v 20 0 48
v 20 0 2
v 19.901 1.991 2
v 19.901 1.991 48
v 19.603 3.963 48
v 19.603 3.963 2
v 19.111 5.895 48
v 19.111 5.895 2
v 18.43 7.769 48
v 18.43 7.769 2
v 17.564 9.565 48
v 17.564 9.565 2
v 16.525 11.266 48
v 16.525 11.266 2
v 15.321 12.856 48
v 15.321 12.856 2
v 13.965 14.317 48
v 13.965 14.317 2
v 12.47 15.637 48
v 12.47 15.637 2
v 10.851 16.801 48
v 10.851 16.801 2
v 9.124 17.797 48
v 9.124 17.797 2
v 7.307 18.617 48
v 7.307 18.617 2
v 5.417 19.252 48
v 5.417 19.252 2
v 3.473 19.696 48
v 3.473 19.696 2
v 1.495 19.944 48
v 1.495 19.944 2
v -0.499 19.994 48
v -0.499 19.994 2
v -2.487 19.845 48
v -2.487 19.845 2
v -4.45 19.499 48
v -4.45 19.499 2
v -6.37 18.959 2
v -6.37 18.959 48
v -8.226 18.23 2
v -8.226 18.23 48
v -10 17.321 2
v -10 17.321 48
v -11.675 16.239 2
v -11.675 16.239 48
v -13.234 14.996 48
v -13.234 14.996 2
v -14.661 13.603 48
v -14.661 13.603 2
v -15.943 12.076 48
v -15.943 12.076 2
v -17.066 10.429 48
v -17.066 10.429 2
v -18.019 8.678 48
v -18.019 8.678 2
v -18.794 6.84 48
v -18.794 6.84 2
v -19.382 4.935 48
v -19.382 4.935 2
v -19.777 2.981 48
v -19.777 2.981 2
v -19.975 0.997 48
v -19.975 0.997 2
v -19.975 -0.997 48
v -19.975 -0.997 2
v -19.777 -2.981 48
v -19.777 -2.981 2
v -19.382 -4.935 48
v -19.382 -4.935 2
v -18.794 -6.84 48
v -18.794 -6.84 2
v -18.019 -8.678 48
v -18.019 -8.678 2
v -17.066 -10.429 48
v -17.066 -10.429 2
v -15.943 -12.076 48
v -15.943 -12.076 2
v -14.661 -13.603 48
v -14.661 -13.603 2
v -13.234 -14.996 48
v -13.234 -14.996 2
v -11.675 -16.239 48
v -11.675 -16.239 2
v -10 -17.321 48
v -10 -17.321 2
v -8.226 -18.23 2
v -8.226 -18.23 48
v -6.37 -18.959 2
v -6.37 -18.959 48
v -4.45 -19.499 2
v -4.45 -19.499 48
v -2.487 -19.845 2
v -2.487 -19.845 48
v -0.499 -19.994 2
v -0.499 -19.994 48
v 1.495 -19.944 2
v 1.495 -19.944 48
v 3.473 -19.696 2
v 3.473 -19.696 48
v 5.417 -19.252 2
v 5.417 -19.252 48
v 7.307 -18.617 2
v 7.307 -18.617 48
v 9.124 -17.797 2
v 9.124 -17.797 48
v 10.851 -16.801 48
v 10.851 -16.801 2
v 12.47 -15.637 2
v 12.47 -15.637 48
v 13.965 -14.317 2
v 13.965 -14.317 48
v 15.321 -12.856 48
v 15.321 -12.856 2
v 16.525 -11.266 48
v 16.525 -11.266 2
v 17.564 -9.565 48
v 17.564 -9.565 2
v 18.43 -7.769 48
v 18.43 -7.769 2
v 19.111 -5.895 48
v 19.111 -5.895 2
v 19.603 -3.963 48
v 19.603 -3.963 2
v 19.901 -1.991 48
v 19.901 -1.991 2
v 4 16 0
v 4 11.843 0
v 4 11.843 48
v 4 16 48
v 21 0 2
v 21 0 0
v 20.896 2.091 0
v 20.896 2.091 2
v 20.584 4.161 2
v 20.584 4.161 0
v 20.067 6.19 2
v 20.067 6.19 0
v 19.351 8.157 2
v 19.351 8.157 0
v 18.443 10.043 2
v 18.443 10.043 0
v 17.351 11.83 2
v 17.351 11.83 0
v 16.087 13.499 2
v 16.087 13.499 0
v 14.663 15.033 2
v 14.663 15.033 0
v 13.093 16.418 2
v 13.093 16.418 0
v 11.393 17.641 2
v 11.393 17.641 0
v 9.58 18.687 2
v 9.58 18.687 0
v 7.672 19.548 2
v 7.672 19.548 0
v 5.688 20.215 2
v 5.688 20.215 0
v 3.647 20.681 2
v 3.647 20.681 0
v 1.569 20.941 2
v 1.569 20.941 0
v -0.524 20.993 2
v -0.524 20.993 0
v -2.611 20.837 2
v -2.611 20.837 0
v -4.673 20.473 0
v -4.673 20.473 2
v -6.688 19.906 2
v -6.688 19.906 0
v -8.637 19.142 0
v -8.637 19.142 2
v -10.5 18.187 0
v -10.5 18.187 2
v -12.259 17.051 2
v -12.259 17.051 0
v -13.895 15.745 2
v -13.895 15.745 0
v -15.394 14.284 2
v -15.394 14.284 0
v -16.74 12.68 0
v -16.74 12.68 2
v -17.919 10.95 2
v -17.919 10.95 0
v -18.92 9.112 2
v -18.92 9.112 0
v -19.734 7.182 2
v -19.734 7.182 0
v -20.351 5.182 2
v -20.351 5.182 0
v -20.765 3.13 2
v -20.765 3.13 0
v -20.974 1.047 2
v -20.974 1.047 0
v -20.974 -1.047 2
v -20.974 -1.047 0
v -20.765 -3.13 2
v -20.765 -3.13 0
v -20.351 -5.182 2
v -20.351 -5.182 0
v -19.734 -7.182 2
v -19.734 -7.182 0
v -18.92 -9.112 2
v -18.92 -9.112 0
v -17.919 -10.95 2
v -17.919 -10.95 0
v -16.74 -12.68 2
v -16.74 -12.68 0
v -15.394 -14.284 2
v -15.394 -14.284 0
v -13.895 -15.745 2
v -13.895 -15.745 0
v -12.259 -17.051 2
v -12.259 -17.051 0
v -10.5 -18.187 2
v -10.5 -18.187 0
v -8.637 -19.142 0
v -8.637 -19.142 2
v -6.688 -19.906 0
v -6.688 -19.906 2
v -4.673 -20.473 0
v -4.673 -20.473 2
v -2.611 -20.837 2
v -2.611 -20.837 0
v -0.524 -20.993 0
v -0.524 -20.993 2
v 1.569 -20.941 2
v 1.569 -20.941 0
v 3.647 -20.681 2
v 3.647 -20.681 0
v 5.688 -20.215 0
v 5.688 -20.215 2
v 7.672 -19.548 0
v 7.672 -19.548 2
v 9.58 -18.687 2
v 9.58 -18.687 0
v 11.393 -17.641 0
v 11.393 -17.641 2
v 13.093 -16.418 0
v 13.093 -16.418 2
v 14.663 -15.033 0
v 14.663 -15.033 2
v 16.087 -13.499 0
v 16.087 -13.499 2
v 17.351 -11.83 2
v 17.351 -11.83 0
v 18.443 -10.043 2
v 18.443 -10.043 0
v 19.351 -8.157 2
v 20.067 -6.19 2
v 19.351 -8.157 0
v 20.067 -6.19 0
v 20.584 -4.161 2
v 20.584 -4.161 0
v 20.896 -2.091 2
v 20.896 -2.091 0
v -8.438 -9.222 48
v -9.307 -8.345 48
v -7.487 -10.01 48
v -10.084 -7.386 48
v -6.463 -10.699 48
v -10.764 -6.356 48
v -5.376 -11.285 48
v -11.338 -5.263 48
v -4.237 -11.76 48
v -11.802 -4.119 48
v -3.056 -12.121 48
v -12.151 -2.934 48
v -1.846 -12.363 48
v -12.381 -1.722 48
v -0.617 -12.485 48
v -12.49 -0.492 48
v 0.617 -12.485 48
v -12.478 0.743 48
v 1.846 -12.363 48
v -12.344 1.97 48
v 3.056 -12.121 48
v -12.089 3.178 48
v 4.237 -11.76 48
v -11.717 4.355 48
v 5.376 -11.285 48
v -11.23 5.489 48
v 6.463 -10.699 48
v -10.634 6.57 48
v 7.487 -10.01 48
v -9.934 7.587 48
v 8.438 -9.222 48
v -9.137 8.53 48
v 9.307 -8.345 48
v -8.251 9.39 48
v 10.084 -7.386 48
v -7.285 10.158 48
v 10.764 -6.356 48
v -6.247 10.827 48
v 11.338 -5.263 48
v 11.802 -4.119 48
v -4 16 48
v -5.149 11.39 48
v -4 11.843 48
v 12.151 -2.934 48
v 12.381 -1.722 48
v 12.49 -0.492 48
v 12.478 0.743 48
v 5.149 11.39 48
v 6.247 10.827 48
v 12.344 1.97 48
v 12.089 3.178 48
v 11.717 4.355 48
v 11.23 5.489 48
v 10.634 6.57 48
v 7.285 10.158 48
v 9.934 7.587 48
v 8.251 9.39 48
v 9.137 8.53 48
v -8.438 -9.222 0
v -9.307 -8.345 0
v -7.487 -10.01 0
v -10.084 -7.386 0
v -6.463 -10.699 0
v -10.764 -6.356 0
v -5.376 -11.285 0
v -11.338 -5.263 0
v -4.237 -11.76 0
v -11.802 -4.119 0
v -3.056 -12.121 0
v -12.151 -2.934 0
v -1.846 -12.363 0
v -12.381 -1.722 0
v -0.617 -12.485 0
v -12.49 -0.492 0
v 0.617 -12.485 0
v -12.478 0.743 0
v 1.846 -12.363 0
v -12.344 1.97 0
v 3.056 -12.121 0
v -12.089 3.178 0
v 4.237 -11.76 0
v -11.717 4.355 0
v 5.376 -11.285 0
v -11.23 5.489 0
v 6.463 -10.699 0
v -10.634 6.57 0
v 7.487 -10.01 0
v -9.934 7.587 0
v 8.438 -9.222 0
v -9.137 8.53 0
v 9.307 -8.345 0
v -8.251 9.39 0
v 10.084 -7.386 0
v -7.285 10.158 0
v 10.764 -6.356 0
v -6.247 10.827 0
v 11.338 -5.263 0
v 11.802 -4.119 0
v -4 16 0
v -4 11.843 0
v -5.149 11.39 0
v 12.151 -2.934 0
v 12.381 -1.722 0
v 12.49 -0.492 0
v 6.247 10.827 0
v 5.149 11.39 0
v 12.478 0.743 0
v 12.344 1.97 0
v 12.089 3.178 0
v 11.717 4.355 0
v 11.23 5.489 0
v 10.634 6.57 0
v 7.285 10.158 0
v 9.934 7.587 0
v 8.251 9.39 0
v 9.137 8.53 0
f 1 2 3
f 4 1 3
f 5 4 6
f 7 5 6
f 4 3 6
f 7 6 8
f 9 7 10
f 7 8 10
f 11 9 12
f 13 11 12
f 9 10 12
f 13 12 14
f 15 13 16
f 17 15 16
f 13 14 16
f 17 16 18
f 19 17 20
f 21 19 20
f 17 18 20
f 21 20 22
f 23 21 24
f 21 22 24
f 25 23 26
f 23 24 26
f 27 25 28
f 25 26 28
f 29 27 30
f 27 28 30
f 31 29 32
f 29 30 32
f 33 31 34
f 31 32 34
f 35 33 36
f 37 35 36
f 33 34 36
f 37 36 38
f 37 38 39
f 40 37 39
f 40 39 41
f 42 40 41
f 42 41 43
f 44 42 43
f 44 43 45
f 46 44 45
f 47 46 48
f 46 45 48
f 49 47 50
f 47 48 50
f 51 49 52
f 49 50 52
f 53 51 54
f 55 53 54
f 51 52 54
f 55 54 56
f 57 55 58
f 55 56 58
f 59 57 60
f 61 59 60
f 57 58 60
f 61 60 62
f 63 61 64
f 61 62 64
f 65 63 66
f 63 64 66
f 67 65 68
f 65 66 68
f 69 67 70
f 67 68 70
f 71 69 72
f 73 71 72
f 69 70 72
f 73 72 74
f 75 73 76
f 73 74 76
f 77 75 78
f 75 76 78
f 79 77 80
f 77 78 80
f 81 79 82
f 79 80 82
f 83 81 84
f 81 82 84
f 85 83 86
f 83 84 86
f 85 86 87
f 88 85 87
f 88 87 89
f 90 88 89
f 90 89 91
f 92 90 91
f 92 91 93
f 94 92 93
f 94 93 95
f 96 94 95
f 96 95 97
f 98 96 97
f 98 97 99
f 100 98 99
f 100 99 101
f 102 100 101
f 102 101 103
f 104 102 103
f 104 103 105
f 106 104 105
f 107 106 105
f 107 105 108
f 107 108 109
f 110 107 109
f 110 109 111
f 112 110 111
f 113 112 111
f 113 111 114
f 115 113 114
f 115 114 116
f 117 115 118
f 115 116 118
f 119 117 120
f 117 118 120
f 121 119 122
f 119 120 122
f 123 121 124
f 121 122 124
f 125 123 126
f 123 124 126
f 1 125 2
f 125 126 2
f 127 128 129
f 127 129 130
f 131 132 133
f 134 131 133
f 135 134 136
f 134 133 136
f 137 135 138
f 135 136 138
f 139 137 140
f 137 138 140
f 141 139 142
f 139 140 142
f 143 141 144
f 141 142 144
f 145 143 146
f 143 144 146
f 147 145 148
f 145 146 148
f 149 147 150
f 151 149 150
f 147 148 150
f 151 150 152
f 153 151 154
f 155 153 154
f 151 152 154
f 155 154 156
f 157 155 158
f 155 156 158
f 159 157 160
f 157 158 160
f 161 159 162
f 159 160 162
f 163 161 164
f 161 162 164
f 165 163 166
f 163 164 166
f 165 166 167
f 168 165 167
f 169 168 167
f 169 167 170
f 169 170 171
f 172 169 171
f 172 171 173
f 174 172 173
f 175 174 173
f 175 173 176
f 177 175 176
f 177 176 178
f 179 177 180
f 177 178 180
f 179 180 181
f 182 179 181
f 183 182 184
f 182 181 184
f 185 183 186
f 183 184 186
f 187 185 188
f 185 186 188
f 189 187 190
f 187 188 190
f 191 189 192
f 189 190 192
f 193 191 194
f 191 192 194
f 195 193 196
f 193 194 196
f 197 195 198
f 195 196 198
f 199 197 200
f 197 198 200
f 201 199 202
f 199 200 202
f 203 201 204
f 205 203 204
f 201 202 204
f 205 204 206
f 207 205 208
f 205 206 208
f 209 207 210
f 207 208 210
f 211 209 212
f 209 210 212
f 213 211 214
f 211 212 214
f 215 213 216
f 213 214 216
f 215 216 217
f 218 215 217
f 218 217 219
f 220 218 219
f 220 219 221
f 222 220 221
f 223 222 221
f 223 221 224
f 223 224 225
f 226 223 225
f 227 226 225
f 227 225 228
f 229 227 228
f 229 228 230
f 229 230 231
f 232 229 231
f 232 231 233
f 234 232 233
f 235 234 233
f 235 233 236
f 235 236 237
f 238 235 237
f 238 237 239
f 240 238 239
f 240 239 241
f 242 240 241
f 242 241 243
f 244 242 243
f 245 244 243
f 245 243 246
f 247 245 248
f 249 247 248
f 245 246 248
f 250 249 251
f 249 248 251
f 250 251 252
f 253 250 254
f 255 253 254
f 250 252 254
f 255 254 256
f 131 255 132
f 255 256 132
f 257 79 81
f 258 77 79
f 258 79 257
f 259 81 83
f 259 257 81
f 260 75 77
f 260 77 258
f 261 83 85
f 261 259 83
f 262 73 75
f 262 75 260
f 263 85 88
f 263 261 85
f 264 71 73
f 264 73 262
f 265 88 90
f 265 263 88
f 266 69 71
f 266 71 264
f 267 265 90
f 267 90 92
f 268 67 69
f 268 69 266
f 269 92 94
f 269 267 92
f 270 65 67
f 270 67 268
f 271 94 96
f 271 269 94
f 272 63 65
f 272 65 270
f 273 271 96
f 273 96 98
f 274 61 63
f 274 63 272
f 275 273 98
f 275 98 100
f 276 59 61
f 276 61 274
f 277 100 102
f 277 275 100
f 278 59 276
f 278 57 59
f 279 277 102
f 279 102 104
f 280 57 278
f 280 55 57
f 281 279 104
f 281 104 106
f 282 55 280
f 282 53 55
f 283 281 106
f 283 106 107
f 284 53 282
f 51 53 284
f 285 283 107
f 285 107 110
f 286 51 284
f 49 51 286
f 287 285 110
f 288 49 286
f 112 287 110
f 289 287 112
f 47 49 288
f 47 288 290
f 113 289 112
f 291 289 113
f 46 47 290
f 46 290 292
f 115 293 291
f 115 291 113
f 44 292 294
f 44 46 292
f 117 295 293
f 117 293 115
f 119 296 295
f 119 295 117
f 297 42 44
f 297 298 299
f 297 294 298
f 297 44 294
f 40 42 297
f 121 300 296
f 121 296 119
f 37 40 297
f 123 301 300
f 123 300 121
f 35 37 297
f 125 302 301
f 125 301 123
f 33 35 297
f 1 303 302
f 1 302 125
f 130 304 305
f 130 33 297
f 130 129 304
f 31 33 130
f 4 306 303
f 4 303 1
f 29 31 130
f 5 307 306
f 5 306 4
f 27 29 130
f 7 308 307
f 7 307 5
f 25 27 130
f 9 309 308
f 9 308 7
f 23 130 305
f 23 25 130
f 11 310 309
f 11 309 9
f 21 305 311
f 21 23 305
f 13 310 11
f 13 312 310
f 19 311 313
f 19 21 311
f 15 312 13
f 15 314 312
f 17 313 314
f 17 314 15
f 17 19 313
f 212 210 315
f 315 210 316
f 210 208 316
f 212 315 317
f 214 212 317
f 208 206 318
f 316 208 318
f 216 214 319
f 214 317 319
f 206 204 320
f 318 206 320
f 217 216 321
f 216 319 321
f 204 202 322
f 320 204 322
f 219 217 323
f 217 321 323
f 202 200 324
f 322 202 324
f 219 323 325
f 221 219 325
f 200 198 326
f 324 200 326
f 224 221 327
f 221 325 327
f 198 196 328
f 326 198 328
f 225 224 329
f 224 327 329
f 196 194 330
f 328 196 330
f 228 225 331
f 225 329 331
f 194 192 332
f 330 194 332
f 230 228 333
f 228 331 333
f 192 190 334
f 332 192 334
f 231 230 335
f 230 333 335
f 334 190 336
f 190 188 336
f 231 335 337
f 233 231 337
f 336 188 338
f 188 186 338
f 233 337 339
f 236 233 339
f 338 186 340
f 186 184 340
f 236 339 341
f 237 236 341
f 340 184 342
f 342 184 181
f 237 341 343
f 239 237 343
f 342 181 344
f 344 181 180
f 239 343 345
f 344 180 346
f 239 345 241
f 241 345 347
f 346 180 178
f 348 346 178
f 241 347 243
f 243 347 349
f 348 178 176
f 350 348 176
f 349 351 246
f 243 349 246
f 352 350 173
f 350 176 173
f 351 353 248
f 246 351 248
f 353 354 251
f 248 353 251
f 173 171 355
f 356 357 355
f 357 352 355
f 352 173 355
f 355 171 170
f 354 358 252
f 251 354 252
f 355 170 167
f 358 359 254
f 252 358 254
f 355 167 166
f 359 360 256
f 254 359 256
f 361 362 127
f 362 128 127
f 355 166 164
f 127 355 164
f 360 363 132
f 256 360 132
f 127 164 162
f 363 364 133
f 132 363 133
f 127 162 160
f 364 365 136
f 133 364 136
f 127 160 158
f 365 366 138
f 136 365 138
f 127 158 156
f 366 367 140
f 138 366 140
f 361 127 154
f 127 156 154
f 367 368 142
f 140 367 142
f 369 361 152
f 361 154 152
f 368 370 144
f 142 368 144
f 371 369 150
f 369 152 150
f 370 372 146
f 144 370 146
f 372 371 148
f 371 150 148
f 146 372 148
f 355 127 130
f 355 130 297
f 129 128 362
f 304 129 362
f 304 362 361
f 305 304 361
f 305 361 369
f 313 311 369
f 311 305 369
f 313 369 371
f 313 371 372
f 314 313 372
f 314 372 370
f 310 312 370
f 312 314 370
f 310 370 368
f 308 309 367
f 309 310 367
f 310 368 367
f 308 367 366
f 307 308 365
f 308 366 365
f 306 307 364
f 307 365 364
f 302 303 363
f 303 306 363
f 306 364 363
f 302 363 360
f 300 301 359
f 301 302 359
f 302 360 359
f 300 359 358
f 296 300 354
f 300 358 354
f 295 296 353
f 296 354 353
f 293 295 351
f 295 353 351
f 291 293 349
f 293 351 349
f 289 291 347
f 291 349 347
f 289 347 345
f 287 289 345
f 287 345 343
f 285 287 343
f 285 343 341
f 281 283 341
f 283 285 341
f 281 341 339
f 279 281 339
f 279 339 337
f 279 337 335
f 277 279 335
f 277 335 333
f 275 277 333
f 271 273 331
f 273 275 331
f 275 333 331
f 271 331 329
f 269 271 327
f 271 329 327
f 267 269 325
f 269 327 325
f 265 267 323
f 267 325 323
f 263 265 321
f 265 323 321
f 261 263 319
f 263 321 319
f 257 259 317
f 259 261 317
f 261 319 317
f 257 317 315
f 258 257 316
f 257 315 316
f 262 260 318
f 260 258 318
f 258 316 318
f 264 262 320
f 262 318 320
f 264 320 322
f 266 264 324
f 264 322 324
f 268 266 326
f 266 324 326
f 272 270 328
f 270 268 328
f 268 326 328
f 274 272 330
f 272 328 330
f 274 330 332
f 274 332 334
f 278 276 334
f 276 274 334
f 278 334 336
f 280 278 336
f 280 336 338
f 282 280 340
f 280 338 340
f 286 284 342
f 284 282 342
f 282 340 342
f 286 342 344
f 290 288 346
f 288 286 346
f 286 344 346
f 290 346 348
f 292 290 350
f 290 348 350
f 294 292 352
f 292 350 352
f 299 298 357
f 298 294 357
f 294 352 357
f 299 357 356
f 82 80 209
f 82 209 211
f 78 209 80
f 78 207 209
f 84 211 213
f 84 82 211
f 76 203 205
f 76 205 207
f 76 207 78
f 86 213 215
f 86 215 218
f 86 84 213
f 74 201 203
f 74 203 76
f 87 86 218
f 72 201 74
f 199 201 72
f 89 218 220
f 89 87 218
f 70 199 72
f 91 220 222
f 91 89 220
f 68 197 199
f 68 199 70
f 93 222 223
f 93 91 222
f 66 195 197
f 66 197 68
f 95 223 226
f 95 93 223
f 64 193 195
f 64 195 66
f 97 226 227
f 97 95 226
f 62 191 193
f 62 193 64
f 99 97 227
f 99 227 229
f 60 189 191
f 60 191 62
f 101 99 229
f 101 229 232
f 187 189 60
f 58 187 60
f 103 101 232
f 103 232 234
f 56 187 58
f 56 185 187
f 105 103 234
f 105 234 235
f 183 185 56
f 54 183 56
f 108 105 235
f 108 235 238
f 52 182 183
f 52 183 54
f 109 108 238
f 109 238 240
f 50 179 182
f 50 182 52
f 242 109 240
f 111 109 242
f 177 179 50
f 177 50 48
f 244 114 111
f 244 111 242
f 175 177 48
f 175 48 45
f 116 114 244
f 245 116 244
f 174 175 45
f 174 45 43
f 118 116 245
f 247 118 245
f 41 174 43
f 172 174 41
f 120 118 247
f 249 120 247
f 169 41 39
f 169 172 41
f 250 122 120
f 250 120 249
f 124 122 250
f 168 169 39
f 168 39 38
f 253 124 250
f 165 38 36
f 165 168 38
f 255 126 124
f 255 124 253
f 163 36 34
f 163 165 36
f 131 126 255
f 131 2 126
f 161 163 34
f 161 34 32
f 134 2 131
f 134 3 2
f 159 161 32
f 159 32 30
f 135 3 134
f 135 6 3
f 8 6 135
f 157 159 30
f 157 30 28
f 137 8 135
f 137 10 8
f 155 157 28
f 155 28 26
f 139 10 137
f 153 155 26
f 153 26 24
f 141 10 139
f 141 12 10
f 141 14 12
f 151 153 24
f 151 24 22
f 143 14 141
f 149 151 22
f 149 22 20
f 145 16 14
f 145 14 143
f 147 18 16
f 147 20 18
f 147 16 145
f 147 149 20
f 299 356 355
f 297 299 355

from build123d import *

# Parameters (mm, degrees)
SKETCH1_R           = 21
BOSS_EXTRUDE1_DEPTH = 2
SKETCH2_R           = 20
BOSS_EXTRUDE2_DEPTH = 46
SKETCH3_R           = 12.5
CUT_EXTRUDE1_DEPTH  = 49
SKETCH4_W           = 8
SKETCH4_H           = 7
CUT_EXTRUDE2_DEPTH  = 48


with BuildPart() as part:
    # Sketch1 → Boss-Extrude1 (new body)
    with BuildSketch(Plane.XY):
        Circle(SKETCH1_R)
    extrude(amount=BOSS_EXTRUDE1_DEPTH)

    # Sketch2 → Boss-Extrude2 (add)
    with BuildSketch(Plane.XY.offset(2)):
        Circle(SKETCH2_R)
    extrude(amount=BOSS_EXTRUDE2_DEPTH)

    # Sketch3 → Cut-Extrude1 (cut, through all)
    with BuildSketch(Plane(origin=(0, 0, 0), x_dir=(-1, 0, 0), z_dir=(0, 0, -1))):
        Circle(SKETCH3_R)
    extrude(amount=-CUT_EXTRUDE1_DEPTH, mode=Mode.SUBTRACT)

    # Sketch4 → Cut-Extrude2 (cut)
    with BuildSketch(Plane(origin=(0, 0, 0), x_dir=(-1, 0, 0), z_dir=(0, 0, -1))):
        with Locations((0, 12.5)):
            Rectangle(SKETCH4_W, SKETCH4_H)
    extrude(amount=-CUT_EXTRUDE2_DEPTH, mode=Mode.SUBTRACT)


solid = part.part
